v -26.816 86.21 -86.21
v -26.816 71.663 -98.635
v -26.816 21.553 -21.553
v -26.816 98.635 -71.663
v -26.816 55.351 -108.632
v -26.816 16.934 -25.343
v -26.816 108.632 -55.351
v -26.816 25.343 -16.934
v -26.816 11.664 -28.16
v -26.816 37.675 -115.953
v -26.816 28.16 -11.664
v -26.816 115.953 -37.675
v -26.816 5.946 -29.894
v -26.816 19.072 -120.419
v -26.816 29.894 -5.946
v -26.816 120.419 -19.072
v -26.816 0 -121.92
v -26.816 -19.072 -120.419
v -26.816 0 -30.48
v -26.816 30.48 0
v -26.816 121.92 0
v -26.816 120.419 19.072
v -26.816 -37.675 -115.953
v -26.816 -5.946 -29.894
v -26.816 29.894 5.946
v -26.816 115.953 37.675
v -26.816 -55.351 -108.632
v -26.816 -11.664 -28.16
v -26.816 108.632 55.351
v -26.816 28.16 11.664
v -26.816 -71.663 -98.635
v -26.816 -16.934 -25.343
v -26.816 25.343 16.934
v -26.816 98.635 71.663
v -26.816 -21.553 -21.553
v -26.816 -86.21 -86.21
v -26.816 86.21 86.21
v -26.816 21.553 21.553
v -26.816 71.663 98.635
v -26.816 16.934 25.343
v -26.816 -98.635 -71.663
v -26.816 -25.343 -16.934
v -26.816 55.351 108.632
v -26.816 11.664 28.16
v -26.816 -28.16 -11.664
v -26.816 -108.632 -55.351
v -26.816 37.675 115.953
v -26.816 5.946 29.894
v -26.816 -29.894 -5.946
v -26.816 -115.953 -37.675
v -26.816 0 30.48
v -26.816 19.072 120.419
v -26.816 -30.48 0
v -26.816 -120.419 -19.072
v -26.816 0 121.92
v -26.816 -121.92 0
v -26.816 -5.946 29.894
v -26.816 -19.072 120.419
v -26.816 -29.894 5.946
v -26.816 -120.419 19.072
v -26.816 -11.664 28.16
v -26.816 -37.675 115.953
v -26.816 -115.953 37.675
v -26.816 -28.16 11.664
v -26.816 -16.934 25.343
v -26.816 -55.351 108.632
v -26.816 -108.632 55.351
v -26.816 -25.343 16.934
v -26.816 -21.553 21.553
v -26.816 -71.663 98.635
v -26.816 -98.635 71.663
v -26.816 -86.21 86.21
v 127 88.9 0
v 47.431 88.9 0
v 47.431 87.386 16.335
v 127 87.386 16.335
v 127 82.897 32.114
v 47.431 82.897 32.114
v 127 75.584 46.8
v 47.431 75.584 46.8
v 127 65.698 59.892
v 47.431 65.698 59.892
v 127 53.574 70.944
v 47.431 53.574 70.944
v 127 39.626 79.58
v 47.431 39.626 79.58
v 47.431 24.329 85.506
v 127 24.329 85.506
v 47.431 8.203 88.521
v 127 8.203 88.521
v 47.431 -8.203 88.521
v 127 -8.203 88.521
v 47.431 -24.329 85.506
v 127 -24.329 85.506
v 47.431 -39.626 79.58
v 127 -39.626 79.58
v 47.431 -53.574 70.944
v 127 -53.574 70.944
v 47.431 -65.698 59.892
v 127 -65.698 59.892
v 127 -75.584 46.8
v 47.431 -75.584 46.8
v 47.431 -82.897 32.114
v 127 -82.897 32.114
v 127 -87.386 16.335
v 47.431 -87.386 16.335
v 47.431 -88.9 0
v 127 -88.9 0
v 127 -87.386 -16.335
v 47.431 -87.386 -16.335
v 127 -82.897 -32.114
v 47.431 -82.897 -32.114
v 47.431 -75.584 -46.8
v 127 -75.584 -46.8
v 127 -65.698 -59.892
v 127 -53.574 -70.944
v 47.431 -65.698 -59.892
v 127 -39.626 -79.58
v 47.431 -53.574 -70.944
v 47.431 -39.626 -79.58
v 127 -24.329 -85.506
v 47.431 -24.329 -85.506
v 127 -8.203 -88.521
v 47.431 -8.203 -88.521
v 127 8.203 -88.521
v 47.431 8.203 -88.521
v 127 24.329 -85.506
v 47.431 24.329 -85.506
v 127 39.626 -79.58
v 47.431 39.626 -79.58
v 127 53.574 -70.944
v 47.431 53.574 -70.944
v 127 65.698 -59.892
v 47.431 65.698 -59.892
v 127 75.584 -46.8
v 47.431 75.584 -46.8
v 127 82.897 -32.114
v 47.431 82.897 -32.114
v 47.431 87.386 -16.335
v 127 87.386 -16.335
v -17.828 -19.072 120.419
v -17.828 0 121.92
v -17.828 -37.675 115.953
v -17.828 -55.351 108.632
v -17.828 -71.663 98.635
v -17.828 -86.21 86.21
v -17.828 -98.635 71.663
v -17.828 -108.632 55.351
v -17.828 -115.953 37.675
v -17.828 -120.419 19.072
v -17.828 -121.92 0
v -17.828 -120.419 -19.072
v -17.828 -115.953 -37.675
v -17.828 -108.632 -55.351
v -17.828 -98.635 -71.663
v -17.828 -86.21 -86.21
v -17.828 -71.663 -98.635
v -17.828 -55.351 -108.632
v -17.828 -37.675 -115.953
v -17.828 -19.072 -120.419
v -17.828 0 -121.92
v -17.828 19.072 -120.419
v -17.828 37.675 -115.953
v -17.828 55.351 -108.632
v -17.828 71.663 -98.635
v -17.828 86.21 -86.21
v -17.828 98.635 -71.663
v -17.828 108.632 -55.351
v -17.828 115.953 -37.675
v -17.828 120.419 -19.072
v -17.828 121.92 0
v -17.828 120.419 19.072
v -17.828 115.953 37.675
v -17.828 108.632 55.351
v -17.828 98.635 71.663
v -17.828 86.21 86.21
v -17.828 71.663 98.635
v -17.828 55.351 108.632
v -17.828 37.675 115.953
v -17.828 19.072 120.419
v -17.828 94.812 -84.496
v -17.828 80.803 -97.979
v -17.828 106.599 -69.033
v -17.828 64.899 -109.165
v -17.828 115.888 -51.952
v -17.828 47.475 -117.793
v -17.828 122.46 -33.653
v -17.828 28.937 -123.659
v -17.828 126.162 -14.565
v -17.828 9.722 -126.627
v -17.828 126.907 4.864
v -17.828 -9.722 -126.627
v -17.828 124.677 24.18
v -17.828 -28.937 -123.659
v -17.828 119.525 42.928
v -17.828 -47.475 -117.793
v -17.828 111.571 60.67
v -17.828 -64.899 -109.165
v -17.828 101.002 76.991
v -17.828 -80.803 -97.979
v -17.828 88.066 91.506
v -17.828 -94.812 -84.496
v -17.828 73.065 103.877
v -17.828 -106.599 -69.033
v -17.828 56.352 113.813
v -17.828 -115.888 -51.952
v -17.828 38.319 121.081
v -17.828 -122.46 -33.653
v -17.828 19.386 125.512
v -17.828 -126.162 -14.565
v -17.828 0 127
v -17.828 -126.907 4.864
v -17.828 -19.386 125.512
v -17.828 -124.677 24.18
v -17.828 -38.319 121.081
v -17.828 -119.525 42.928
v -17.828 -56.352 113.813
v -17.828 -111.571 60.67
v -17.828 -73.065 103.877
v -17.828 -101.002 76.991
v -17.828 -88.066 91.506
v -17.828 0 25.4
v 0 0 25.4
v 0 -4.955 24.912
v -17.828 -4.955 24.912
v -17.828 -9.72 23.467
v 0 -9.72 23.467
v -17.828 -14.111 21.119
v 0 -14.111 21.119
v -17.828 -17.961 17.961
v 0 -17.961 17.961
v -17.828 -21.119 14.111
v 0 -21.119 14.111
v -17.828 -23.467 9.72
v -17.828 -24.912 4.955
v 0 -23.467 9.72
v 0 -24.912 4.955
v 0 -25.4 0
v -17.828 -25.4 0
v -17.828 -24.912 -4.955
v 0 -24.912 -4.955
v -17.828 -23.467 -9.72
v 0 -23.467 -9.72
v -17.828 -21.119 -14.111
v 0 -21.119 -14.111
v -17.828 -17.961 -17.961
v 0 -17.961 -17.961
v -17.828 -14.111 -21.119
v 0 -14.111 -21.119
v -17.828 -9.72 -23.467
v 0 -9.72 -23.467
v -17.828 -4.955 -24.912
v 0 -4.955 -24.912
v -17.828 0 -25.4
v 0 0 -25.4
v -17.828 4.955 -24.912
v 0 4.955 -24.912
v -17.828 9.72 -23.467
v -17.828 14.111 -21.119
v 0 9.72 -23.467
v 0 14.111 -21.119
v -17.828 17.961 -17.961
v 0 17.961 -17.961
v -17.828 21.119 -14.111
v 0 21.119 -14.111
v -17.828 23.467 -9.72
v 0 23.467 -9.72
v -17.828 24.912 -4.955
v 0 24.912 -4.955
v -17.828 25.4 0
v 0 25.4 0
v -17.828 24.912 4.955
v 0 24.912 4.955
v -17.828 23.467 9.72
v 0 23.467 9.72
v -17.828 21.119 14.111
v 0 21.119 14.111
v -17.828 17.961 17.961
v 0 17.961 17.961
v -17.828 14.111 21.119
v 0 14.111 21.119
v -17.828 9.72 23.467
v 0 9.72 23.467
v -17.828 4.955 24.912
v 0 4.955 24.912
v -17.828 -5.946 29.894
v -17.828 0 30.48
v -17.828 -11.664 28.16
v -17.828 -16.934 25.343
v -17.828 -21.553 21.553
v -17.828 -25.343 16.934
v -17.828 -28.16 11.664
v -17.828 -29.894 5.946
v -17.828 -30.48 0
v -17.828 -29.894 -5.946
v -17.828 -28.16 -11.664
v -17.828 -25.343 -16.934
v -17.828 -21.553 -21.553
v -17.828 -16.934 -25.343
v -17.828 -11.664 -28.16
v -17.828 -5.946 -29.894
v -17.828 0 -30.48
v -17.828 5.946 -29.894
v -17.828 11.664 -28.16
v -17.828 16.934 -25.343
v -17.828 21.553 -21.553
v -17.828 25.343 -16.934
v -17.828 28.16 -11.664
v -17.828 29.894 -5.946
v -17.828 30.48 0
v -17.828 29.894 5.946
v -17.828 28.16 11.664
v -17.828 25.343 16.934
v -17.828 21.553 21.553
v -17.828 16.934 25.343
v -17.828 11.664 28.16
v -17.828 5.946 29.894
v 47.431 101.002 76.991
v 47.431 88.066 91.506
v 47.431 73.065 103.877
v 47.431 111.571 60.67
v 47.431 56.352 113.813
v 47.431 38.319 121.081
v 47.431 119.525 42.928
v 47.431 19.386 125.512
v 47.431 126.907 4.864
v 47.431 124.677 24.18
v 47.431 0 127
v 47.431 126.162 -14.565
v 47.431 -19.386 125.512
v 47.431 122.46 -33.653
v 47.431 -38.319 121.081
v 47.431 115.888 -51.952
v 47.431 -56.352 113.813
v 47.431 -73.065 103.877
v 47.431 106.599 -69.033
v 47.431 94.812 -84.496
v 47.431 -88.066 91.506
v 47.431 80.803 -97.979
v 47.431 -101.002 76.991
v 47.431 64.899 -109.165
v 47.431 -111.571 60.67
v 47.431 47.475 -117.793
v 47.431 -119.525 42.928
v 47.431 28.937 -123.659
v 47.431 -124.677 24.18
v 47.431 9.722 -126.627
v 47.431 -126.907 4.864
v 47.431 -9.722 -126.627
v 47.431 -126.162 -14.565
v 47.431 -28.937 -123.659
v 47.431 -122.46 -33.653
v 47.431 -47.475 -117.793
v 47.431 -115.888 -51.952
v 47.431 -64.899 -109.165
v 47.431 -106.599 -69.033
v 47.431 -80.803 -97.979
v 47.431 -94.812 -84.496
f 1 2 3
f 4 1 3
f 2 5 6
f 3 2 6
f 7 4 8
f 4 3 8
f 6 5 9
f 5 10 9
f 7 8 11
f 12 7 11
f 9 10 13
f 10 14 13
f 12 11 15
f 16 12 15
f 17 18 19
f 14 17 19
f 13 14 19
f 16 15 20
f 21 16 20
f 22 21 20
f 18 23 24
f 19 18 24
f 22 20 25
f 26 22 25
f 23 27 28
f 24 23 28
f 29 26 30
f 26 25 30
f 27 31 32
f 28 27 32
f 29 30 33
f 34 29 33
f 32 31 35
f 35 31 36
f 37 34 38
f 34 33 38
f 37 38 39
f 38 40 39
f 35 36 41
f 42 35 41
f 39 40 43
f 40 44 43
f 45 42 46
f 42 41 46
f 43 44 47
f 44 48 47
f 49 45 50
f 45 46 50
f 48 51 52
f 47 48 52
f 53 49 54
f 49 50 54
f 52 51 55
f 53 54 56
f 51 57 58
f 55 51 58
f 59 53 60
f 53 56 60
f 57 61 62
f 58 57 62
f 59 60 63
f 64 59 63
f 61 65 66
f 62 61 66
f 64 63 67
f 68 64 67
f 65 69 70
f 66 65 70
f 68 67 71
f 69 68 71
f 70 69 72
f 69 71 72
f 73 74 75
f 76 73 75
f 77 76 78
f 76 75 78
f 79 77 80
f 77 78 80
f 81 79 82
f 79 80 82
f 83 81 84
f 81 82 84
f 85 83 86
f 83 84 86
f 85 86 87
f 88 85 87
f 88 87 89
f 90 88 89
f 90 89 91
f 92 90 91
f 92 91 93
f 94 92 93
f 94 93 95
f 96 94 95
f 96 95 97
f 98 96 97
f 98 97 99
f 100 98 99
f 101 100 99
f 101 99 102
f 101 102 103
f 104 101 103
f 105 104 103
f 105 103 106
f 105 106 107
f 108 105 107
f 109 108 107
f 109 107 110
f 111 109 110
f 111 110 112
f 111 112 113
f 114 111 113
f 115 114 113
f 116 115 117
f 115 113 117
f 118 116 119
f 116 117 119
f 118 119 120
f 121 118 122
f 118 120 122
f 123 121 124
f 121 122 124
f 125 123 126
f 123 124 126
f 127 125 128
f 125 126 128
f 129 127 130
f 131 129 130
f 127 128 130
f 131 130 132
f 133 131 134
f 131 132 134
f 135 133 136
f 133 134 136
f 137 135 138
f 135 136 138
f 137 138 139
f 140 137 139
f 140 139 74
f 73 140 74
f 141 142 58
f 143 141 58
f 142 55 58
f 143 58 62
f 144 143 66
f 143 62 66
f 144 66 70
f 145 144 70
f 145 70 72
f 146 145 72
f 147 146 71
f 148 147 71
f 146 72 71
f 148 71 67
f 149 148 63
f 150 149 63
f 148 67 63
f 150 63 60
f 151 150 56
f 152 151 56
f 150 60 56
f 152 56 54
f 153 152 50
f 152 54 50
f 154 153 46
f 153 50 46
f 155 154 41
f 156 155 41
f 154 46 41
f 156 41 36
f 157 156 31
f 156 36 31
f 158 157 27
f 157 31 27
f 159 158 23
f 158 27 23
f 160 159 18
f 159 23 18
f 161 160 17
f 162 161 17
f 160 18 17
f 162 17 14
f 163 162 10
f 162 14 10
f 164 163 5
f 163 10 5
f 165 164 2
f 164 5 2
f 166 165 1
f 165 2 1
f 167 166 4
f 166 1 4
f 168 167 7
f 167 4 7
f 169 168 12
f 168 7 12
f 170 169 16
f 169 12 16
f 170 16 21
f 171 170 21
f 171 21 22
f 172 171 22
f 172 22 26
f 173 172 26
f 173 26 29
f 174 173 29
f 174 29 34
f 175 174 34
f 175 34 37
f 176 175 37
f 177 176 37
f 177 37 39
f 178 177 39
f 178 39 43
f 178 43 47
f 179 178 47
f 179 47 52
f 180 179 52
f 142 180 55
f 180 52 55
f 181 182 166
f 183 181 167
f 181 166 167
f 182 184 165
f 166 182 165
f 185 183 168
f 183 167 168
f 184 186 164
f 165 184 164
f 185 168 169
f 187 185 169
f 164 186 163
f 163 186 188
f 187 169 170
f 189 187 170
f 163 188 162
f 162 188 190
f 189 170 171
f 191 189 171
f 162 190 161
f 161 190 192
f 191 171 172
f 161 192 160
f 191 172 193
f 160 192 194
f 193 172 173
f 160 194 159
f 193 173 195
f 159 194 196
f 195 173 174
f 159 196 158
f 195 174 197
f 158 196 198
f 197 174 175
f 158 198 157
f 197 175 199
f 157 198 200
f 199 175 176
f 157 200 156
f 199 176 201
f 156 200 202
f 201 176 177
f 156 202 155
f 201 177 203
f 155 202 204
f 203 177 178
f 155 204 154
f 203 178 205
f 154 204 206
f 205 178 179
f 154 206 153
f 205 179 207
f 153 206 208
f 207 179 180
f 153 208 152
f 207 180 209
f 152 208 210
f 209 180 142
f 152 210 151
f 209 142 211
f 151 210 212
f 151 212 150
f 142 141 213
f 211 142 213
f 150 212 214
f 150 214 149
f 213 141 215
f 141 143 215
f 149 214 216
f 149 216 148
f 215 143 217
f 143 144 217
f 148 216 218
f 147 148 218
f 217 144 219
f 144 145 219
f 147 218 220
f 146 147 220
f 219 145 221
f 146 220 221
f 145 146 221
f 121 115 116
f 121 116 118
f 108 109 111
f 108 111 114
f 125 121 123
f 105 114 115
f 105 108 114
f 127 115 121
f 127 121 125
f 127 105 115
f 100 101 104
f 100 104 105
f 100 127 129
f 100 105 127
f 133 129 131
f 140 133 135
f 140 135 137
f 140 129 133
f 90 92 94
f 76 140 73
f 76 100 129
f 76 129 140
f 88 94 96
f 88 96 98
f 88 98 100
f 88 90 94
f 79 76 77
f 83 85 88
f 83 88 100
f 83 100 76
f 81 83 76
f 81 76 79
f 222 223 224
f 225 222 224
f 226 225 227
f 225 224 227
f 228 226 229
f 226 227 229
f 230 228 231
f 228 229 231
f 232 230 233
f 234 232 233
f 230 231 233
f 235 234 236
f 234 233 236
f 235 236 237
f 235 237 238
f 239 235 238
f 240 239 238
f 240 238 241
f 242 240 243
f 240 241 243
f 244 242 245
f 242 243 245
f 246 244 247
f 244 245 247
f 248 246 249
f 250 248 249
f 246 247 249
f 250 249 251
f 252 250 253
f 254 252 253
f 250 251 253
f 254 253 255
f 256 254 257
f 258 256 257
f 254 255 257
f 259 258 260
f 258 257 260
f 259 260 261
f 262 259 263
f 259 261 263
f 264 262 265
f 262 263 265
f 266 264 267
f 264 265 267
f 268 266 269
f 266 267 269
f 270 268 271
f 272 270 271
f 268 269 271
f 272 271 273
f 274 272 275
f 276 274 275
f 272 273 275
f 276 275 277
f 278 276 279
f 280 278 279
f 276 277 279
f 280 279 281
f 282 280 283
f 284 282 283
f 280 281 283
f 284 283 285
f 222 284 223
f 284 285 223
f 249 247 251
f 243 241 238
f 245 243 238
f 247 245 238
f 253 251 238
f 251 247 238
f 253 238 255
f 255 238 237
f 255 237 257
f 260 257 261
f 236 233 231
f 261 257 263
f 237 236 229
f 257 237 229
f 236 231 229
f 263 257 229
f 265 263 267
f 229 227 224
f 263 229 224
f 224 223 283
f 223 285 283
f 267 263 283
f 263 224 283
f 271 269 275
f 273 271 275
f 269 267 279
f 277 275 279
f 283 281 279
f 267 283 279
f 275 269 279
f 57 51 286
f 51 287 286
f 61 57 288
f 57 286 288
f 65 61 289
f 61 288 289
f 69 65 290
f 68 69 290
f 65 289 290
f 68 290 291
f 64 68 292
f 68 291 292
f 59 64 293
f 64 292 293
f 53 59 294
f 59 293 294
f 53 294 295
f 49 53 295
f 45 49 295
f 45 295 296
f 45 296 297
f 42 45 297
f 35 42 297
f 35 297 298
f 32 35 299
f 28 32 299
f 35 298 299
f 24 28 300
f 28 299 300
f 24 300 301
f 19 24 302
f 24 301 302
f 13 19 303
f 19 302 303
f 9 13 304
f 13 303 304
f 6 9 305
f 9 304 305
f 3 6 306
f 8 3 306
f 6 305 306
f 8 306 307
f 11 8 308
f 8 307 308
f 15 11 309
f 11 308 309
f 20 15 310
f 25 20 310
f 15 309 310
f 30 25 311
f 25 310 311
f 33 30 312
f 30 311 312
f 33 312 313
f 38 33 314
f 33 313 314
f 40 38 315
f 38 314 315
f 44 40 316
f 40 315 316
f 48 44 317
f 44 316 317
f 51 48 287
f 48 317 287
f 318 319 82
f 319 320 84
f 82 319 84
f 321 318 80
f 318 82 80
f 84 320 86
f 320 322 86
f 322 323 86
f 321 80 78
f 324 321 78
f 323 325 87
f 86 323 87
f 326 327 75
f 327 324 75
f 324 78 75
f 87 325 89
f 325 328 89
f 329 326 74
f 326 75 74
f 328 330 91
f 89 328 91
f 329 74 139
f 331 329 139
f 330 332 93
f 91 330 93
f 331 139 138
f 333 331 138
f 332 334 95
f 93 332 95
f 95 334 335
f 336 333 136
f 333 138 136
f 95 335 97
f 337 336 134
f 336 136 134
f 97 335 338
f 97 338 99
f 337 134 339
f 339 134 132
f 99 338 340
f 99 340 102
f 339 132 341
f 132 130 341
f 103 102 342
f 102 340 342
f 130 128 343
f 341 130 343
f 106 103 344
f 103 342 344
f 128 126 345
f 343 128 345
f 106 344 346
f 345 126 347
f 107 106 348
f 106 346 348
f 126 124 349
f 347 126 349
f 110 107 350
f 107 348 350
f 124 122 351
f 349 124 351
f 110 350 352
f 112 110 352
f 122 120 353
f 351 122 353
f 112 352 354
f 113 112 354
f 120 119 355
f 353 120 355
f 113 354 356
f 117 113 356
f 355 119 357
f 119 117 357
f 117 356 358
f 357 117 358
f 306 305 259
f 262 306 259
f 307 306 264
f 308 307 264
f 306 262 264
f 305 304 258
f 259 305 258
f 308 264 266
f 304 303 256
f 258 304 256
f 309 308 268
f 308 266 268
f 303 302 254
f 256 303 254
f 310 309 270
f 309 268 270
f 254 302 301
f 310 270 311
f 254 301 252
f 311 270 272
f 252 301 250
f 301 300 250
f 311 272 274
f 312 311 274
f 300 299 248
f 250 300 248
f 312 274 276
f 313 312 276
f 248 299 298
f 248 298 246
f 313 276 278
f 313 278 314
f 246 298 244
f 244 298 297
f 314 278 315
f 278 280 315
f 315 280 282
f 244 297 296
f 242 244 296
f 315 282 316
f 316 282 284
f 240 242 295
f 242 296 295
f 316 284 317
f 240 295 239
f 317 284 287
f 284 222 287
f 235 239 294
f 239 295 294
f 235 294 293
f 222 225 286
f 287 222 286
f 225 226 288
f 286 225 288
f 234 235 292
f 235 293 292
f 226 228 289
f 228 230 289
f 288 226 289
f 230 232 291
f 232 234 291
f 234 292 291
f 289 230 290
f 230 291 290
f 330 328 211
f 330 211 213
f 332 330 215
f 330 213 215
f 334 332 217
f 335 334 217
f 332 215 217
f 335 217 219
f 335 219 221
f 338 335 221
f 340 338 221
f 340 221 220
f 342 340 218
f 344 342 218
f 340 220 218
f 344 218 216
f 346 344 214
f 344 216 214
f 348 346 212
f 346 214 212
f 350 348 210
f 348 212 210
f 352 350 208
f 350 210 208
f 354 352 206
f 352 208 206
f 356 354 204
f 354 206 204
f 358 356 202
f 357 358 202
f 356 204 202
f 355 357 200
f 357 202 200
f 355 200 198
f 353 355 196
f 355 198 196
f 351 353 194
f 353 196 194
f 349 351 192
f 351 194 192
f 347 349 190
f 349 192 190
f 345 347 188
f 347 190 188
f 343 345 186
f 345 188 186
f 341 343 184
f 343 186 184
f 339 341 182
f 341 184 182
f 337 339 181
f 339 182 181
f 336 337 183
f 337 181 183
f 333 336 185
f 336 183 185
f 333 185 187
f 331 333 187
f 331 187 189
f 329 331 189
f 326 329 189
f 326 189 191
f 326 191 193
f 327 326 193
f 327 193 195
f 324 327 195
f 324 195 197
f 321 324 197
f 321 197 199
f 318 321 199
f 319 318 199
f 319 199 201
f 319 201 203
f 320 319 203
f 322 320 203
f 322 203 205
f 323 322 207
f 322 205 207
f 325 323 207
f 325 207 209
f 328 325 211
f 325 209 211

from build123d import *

# Parameters (mm, degrees)
F2_R     = 88.9
F4_DEPTH = 127


# Not quite as in the source:
# - the program builds the solid bodies; features that only make, move or delete a surface that nothing else refers to are left out


with BuildPart() as f1:
    # F0 (on Front) → F1 (revolve)
    with BuildSketch(Plane.XZ):
        Polygon((-17.8278337446, 25.4), (0, 25.4), (55.6368945653, 25.4), (55.6368945653, 50.8), (47.4307299643, 50.8), (47.4307299643, 127), (-17.8278337446, 127), (-17.8278337446, 121.92), (-26.8155404944, 121.92), (-26.8155404944, 30.48), (-17.8278337446, 30.48), align=None)
    revolve(axis=Axis((17.3414491085, 0, 0), (1, 0, 0)))

    # F2 (on Right) → F4 (join)
    with BuildSketch(Plane.YZ):
        Circle(F2_R)
    extrude(amount=F4_DEPTH)


solid = f1.part
